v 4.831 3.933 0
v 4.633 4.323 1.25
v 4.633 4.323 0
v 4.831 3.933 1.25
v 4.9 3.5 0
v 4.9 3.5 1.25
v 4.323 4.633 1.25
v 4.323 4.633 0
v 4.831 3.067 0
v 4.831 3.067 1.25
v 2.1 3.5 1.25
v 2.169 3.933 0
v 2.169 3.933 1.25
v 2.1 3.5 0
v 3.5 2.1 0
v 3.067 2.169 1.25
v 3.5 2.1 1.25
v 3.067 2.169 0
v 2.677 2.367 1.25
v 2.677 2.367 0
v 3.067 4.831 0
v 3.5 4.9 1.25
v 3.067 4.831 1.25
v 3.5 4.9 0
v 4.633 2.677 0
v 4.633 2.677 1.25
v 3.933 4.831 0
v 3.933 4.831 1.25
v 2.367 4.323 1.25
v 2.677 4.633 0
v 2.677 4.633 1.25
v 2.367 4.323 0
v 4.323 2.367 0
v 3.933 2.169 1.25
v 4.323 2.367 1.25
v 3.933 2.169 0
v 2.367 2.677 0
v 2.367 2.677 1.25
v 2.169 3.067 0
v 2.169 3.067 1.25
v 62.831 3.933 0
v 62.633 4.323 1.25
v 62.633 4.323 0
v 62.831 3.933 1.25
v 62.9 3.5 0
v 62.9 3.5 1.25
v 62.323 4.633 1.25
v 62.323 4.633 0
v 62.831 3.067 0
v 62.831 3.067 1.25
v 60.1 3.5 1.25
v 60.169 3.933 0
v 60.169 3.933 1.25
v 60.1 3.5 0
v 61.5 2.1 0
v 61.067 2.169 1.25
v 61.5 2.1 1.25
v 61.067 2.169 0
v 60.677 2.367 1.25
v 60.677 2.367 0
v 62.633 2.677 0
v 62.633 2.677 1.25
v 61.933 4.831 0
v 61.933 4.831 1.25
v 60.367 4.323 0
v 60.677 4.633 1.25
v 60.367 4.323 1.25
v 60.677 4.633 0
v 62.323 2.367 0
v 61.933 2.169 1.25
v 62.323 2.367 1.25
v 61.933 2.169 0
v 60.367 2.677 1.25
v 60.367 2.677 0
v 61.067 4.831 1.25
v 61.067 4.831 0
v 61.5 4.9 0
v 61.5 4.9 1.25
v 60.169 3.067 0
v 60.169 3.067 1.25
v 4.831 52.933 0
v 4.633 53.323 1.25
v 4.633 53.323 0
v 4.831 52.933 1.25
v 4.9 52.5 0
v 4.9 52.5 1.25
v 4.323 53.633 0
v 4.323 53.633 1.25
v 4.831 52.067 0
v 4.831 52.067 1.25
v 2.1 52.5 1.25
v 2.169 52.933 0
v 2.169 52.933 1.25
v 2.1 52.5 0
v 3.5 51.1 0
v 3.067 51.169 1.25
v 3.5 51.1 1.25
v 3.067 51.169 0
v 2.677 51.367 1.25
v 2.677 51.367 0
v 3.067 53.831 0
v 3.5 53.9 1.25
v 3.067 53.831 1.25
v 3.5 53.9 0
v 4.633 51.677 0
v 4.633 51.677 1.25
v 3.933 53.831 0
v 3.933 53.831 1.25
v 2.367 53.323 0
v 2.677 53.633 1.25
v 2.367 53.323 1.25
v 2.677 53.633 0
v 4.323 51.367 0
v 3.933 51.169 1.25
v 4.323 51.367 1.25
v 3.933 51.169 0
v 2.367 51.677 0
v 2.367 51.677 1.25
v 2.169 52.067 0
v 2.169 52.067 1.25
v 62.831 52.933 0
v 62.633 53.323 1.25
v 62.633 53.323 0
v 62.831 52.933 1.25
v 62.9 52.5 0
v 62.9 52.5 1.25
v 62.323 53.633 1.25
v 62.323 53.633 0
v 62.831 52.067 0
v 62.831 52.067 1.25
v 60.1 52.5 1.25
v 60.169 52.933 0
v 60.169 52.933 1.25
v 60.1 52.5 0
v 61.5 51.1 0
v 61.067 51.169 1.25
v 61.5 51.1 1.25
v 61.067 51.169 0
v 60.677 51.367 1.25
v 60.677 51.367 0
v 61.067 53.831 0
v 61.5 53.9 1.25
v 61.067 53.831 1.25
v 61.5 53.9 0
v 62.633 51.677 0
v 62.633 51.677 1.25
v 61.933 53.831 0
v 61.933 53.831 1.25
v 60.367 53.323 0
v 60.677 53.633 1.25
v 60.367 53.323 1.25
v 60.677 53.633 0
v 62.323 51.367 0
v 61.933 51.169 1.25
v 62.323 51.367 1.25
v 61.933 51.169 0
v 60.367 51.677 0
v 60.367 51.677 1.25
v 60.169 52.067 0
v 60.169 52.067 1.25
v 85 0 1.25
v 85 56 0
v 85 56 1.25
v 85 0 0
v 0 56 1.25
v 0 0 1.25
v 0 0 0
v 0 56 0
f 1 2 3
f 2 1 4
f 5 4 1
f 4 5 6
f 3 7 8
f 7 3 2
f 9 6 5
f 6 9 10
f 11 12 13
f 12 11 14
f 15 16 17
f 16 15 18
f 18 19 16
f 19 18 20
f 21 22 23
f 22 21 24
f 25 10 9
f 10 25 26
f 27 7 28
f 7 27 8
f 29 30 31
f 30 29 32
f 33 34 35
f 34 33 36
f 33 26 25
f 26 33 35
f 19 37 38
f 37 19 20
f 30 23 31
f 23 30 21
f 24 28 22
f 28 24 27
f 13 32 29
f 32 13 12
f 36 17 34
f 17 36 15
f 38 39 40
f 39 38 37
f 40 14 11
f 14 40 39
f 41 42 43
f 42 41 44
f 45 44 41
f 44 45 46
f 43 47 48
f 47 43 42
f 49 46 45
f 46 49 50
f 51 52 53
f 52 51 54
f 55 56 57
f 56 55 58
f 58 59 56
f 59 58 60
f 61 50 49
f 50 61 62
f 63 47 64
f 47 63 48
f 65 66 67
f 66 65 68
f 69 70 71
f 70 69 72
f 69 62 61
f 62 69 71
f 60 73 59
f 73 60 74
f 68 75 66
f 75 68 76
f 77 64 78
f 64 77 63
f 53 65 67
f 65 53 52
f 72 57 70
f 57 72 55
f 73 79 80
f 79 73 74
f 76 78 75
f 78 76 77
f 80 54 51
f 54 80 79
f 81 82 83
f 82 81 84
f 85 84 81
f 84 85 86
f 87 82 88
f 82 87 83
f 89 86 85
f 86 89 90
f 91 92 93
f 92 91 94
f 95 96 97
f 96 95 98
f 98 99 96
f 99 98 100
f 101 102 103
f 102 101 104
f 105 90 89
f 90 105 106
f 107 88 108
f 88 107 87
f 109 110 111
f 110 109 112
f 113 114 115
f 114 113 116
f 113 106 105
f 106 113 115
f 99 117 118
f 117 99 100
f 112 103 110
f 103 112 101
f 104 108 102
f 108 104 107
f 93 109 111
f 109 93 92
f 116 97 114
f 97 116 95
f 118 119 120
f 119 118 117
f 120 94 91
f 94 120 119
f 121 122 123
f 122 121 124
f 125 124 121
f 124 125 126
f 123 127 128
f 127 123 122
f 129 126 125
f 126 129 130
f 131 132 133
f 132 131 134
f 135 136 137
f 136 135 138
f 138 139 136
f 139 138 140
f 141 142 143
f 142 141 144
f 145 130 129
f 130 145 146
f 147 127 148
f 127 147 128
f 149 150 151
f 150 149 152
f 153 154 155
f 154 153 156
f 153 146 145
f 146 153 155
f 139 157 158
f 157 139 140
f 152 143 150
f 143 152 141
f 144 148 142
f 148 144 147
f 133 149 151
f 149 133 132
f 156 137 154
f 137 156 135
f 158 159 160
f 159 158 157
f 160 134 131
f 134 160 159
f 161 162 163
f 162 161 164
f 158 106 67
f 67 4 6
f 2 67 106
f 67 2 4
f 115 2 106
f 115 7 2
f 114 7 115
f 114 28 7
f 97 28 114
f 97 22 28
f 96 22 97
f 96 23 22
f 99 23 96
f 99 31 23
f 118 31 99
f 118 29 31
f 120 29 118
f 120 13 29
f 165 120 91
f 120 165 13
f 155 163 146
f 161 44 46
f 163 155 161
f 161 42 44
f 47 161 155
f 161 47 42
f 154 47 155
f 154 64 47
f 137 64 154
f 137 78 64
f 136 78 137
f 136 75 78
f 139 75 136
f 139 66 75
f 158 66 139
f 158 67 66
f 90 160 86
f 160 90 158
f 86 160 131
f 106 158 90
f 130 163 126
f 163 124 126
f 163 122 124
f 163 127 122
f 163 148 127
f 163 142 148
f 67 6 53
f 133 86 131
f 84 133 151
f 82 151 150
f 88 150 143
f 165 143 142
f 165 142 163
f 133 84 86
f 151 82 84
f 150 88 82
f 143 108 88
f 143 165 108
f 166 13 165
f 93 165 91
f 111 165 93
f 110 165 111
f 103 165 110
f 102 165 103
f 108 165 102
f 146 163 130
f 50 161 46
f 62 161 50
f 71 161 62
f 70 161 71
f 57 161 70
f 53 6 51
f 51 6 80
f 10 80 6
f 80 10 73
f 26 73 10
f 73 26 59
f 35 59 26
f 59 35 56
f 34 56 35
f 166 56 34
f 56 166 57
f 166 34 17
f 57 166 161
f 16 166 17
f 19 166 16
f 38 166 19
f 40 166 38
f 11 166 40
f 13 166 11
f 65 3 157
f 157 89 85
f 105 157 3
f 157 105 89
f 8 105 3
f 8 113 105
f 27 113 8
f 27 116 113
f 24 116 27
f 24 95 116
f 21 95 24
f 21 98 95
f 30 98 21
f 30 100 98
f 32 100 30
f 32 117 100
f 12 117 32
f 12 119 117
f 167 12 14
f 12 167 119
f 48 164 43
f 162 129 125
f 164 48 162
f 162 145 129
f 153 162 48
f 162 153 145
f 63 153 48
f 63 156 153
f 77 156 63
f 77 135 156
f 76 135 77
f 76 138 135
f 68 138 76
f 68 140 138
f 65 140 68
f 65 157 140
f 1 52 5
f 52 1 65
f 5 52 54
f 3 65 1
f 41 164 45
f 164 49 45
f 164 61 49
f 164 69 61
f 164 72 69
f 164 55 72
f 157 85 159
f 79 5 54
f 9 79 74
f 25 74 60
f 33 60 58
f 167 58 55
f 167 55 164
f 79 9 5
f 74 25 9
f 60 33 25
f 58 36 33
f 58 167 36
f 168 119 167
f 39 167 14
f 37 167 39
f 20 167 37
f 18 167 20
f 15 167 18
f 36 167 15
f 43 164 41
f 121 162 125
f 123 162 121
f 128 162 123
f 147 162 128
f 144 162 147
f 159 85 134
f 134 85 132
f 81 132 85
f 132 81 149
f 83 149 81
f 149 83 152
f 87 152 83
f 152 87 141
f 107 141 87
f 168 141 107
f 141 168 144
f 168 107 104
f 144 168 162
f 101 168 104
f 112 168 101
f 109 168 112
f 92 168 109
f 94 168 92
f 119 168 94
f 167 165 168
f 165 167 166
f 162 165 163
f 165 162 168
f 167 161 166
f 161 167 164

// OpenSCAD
//Shut your Pi Hole! 
//An OpenSCAD library to assist with designing Raspberry Pi accessories

//This work is licensed under the Creative Commons Attribution-ShareAlike 4.0 International License. To view a copy of this license, visit http://creativecommons.org/licenses/by-sa/4.0/.
//© 2016 Dale Price

//Pi dimensions sourced from https://www.raspberrypi.org/documentation/hardware/raspberrypi/mechanical/
//Currently supports "1B", "1A+", "1B+", "2B", "3B", "Zero"

//get vector of [x,y] vectors of locations of mounting holes based on Pi version
function piHoleLocations (board="3B") = 
	(board=="1A+" || board=="1B+" || board=="2B" || board=="3B") ?
		[[3.5, 3.5], [61.5, 3.5], [3.5, 52.5], [61.5, 52.5]] : //pi 1B+, 2B, 3B
	(board=="Zero") ?
		[[3.5, 3.5], [61.5, 3.5], [3.5, 26.5], [61.5, 26.5]] : //pi zero
	(board=="1B") ?
		[[80, 43.5], [25, 17.5]] :
	[]; //invalid board

//get vector of [x,y,z] dimensions of board
//	dimensions are for PCB only, not ports or anything else
function piBoardDim (board="3B") =
	(board=="1B" || board=="1B+" || board=="2B" || board=="3B") ?
		[85, 56, 1.25] :
	(board=="Zero") ?
		[65, 30, 1.25] :
	(board == "1A+") ?
		[65, 56, 1.25] :
	[0,0,0];

//Mounting holes for a Raspberry Pi of the specified version
//	Parameters
//		board: the version of the raspberry pi to generate holes for
//		depth: the depth of the holes in mm
module piHoles (board, depth = 5, preview=true) {
	hd = 2.8; //radius of pi mounting holes plus a tiny bit extra to account for shrinkage when 3D printing
	hr = hd/2;

	//preview of the board itself
	if(preview==true)
		% piBoard(board);
	
	//mounting holes
	for(holePos = piHoleLocations(board)) {
		translate([holePos[0], holePos[1], -depth]) cylinder(d=hd, h=depth);
	}
}

//Preview of board dimensions for Raspberry Pi of the specified version
module piBoard (board) {
	difference() {
		cube(piBoardDim(board), center=false);
		translate([0,0,piBoardDim(board)[2] + 0.01]) piHoles(board, piBoardDim(board)[2] + 0.02, false);
	}

	//warn about possible inaccuracy of boards that don't currently have official documentation
	if(board == "1B") {
		echo("CAUTION: The mounting hole positions for the board you have selected may not be accurate because the Raspberry Pi Foundation does not currently provide official mechanical drawings for it.");
	}
}

//Snap-fit posts for mounting the Raspberry Pi
//	Parameters
//		board: version of the raspberry pi to mount
//		height: height of the top surface of the raspberry pi board off the base of the posts
//		preview: whether or not to show a preview of the board in place
module piPosts(board, height=5, preview=true) {
	piSize = piBoardDim(board);
	piHolePos = piHoleLocations(board);

	module pcbPost(height) {
		cylinder(d=2, h=height);
		cylinder(d1=5, d2=2, h=height - piSize[2] - 0.25);

		translate([0, 0.4, height]) scale([1.1, 1.1, 1]) cylinder(d=2, h=0.5);
	}
	
	for(holePos = piHolePos) {
		translate([holePos[0], holePos[1], 0]) pcbPost(height);
	}

	if(preview==true)
		% translate([0,0,height-piSize[2]]) piBoard(board);
}

color("DarkGreen", 1, $fn=20) {
	piBoard("3B");
    //piPosts("3B");
}
